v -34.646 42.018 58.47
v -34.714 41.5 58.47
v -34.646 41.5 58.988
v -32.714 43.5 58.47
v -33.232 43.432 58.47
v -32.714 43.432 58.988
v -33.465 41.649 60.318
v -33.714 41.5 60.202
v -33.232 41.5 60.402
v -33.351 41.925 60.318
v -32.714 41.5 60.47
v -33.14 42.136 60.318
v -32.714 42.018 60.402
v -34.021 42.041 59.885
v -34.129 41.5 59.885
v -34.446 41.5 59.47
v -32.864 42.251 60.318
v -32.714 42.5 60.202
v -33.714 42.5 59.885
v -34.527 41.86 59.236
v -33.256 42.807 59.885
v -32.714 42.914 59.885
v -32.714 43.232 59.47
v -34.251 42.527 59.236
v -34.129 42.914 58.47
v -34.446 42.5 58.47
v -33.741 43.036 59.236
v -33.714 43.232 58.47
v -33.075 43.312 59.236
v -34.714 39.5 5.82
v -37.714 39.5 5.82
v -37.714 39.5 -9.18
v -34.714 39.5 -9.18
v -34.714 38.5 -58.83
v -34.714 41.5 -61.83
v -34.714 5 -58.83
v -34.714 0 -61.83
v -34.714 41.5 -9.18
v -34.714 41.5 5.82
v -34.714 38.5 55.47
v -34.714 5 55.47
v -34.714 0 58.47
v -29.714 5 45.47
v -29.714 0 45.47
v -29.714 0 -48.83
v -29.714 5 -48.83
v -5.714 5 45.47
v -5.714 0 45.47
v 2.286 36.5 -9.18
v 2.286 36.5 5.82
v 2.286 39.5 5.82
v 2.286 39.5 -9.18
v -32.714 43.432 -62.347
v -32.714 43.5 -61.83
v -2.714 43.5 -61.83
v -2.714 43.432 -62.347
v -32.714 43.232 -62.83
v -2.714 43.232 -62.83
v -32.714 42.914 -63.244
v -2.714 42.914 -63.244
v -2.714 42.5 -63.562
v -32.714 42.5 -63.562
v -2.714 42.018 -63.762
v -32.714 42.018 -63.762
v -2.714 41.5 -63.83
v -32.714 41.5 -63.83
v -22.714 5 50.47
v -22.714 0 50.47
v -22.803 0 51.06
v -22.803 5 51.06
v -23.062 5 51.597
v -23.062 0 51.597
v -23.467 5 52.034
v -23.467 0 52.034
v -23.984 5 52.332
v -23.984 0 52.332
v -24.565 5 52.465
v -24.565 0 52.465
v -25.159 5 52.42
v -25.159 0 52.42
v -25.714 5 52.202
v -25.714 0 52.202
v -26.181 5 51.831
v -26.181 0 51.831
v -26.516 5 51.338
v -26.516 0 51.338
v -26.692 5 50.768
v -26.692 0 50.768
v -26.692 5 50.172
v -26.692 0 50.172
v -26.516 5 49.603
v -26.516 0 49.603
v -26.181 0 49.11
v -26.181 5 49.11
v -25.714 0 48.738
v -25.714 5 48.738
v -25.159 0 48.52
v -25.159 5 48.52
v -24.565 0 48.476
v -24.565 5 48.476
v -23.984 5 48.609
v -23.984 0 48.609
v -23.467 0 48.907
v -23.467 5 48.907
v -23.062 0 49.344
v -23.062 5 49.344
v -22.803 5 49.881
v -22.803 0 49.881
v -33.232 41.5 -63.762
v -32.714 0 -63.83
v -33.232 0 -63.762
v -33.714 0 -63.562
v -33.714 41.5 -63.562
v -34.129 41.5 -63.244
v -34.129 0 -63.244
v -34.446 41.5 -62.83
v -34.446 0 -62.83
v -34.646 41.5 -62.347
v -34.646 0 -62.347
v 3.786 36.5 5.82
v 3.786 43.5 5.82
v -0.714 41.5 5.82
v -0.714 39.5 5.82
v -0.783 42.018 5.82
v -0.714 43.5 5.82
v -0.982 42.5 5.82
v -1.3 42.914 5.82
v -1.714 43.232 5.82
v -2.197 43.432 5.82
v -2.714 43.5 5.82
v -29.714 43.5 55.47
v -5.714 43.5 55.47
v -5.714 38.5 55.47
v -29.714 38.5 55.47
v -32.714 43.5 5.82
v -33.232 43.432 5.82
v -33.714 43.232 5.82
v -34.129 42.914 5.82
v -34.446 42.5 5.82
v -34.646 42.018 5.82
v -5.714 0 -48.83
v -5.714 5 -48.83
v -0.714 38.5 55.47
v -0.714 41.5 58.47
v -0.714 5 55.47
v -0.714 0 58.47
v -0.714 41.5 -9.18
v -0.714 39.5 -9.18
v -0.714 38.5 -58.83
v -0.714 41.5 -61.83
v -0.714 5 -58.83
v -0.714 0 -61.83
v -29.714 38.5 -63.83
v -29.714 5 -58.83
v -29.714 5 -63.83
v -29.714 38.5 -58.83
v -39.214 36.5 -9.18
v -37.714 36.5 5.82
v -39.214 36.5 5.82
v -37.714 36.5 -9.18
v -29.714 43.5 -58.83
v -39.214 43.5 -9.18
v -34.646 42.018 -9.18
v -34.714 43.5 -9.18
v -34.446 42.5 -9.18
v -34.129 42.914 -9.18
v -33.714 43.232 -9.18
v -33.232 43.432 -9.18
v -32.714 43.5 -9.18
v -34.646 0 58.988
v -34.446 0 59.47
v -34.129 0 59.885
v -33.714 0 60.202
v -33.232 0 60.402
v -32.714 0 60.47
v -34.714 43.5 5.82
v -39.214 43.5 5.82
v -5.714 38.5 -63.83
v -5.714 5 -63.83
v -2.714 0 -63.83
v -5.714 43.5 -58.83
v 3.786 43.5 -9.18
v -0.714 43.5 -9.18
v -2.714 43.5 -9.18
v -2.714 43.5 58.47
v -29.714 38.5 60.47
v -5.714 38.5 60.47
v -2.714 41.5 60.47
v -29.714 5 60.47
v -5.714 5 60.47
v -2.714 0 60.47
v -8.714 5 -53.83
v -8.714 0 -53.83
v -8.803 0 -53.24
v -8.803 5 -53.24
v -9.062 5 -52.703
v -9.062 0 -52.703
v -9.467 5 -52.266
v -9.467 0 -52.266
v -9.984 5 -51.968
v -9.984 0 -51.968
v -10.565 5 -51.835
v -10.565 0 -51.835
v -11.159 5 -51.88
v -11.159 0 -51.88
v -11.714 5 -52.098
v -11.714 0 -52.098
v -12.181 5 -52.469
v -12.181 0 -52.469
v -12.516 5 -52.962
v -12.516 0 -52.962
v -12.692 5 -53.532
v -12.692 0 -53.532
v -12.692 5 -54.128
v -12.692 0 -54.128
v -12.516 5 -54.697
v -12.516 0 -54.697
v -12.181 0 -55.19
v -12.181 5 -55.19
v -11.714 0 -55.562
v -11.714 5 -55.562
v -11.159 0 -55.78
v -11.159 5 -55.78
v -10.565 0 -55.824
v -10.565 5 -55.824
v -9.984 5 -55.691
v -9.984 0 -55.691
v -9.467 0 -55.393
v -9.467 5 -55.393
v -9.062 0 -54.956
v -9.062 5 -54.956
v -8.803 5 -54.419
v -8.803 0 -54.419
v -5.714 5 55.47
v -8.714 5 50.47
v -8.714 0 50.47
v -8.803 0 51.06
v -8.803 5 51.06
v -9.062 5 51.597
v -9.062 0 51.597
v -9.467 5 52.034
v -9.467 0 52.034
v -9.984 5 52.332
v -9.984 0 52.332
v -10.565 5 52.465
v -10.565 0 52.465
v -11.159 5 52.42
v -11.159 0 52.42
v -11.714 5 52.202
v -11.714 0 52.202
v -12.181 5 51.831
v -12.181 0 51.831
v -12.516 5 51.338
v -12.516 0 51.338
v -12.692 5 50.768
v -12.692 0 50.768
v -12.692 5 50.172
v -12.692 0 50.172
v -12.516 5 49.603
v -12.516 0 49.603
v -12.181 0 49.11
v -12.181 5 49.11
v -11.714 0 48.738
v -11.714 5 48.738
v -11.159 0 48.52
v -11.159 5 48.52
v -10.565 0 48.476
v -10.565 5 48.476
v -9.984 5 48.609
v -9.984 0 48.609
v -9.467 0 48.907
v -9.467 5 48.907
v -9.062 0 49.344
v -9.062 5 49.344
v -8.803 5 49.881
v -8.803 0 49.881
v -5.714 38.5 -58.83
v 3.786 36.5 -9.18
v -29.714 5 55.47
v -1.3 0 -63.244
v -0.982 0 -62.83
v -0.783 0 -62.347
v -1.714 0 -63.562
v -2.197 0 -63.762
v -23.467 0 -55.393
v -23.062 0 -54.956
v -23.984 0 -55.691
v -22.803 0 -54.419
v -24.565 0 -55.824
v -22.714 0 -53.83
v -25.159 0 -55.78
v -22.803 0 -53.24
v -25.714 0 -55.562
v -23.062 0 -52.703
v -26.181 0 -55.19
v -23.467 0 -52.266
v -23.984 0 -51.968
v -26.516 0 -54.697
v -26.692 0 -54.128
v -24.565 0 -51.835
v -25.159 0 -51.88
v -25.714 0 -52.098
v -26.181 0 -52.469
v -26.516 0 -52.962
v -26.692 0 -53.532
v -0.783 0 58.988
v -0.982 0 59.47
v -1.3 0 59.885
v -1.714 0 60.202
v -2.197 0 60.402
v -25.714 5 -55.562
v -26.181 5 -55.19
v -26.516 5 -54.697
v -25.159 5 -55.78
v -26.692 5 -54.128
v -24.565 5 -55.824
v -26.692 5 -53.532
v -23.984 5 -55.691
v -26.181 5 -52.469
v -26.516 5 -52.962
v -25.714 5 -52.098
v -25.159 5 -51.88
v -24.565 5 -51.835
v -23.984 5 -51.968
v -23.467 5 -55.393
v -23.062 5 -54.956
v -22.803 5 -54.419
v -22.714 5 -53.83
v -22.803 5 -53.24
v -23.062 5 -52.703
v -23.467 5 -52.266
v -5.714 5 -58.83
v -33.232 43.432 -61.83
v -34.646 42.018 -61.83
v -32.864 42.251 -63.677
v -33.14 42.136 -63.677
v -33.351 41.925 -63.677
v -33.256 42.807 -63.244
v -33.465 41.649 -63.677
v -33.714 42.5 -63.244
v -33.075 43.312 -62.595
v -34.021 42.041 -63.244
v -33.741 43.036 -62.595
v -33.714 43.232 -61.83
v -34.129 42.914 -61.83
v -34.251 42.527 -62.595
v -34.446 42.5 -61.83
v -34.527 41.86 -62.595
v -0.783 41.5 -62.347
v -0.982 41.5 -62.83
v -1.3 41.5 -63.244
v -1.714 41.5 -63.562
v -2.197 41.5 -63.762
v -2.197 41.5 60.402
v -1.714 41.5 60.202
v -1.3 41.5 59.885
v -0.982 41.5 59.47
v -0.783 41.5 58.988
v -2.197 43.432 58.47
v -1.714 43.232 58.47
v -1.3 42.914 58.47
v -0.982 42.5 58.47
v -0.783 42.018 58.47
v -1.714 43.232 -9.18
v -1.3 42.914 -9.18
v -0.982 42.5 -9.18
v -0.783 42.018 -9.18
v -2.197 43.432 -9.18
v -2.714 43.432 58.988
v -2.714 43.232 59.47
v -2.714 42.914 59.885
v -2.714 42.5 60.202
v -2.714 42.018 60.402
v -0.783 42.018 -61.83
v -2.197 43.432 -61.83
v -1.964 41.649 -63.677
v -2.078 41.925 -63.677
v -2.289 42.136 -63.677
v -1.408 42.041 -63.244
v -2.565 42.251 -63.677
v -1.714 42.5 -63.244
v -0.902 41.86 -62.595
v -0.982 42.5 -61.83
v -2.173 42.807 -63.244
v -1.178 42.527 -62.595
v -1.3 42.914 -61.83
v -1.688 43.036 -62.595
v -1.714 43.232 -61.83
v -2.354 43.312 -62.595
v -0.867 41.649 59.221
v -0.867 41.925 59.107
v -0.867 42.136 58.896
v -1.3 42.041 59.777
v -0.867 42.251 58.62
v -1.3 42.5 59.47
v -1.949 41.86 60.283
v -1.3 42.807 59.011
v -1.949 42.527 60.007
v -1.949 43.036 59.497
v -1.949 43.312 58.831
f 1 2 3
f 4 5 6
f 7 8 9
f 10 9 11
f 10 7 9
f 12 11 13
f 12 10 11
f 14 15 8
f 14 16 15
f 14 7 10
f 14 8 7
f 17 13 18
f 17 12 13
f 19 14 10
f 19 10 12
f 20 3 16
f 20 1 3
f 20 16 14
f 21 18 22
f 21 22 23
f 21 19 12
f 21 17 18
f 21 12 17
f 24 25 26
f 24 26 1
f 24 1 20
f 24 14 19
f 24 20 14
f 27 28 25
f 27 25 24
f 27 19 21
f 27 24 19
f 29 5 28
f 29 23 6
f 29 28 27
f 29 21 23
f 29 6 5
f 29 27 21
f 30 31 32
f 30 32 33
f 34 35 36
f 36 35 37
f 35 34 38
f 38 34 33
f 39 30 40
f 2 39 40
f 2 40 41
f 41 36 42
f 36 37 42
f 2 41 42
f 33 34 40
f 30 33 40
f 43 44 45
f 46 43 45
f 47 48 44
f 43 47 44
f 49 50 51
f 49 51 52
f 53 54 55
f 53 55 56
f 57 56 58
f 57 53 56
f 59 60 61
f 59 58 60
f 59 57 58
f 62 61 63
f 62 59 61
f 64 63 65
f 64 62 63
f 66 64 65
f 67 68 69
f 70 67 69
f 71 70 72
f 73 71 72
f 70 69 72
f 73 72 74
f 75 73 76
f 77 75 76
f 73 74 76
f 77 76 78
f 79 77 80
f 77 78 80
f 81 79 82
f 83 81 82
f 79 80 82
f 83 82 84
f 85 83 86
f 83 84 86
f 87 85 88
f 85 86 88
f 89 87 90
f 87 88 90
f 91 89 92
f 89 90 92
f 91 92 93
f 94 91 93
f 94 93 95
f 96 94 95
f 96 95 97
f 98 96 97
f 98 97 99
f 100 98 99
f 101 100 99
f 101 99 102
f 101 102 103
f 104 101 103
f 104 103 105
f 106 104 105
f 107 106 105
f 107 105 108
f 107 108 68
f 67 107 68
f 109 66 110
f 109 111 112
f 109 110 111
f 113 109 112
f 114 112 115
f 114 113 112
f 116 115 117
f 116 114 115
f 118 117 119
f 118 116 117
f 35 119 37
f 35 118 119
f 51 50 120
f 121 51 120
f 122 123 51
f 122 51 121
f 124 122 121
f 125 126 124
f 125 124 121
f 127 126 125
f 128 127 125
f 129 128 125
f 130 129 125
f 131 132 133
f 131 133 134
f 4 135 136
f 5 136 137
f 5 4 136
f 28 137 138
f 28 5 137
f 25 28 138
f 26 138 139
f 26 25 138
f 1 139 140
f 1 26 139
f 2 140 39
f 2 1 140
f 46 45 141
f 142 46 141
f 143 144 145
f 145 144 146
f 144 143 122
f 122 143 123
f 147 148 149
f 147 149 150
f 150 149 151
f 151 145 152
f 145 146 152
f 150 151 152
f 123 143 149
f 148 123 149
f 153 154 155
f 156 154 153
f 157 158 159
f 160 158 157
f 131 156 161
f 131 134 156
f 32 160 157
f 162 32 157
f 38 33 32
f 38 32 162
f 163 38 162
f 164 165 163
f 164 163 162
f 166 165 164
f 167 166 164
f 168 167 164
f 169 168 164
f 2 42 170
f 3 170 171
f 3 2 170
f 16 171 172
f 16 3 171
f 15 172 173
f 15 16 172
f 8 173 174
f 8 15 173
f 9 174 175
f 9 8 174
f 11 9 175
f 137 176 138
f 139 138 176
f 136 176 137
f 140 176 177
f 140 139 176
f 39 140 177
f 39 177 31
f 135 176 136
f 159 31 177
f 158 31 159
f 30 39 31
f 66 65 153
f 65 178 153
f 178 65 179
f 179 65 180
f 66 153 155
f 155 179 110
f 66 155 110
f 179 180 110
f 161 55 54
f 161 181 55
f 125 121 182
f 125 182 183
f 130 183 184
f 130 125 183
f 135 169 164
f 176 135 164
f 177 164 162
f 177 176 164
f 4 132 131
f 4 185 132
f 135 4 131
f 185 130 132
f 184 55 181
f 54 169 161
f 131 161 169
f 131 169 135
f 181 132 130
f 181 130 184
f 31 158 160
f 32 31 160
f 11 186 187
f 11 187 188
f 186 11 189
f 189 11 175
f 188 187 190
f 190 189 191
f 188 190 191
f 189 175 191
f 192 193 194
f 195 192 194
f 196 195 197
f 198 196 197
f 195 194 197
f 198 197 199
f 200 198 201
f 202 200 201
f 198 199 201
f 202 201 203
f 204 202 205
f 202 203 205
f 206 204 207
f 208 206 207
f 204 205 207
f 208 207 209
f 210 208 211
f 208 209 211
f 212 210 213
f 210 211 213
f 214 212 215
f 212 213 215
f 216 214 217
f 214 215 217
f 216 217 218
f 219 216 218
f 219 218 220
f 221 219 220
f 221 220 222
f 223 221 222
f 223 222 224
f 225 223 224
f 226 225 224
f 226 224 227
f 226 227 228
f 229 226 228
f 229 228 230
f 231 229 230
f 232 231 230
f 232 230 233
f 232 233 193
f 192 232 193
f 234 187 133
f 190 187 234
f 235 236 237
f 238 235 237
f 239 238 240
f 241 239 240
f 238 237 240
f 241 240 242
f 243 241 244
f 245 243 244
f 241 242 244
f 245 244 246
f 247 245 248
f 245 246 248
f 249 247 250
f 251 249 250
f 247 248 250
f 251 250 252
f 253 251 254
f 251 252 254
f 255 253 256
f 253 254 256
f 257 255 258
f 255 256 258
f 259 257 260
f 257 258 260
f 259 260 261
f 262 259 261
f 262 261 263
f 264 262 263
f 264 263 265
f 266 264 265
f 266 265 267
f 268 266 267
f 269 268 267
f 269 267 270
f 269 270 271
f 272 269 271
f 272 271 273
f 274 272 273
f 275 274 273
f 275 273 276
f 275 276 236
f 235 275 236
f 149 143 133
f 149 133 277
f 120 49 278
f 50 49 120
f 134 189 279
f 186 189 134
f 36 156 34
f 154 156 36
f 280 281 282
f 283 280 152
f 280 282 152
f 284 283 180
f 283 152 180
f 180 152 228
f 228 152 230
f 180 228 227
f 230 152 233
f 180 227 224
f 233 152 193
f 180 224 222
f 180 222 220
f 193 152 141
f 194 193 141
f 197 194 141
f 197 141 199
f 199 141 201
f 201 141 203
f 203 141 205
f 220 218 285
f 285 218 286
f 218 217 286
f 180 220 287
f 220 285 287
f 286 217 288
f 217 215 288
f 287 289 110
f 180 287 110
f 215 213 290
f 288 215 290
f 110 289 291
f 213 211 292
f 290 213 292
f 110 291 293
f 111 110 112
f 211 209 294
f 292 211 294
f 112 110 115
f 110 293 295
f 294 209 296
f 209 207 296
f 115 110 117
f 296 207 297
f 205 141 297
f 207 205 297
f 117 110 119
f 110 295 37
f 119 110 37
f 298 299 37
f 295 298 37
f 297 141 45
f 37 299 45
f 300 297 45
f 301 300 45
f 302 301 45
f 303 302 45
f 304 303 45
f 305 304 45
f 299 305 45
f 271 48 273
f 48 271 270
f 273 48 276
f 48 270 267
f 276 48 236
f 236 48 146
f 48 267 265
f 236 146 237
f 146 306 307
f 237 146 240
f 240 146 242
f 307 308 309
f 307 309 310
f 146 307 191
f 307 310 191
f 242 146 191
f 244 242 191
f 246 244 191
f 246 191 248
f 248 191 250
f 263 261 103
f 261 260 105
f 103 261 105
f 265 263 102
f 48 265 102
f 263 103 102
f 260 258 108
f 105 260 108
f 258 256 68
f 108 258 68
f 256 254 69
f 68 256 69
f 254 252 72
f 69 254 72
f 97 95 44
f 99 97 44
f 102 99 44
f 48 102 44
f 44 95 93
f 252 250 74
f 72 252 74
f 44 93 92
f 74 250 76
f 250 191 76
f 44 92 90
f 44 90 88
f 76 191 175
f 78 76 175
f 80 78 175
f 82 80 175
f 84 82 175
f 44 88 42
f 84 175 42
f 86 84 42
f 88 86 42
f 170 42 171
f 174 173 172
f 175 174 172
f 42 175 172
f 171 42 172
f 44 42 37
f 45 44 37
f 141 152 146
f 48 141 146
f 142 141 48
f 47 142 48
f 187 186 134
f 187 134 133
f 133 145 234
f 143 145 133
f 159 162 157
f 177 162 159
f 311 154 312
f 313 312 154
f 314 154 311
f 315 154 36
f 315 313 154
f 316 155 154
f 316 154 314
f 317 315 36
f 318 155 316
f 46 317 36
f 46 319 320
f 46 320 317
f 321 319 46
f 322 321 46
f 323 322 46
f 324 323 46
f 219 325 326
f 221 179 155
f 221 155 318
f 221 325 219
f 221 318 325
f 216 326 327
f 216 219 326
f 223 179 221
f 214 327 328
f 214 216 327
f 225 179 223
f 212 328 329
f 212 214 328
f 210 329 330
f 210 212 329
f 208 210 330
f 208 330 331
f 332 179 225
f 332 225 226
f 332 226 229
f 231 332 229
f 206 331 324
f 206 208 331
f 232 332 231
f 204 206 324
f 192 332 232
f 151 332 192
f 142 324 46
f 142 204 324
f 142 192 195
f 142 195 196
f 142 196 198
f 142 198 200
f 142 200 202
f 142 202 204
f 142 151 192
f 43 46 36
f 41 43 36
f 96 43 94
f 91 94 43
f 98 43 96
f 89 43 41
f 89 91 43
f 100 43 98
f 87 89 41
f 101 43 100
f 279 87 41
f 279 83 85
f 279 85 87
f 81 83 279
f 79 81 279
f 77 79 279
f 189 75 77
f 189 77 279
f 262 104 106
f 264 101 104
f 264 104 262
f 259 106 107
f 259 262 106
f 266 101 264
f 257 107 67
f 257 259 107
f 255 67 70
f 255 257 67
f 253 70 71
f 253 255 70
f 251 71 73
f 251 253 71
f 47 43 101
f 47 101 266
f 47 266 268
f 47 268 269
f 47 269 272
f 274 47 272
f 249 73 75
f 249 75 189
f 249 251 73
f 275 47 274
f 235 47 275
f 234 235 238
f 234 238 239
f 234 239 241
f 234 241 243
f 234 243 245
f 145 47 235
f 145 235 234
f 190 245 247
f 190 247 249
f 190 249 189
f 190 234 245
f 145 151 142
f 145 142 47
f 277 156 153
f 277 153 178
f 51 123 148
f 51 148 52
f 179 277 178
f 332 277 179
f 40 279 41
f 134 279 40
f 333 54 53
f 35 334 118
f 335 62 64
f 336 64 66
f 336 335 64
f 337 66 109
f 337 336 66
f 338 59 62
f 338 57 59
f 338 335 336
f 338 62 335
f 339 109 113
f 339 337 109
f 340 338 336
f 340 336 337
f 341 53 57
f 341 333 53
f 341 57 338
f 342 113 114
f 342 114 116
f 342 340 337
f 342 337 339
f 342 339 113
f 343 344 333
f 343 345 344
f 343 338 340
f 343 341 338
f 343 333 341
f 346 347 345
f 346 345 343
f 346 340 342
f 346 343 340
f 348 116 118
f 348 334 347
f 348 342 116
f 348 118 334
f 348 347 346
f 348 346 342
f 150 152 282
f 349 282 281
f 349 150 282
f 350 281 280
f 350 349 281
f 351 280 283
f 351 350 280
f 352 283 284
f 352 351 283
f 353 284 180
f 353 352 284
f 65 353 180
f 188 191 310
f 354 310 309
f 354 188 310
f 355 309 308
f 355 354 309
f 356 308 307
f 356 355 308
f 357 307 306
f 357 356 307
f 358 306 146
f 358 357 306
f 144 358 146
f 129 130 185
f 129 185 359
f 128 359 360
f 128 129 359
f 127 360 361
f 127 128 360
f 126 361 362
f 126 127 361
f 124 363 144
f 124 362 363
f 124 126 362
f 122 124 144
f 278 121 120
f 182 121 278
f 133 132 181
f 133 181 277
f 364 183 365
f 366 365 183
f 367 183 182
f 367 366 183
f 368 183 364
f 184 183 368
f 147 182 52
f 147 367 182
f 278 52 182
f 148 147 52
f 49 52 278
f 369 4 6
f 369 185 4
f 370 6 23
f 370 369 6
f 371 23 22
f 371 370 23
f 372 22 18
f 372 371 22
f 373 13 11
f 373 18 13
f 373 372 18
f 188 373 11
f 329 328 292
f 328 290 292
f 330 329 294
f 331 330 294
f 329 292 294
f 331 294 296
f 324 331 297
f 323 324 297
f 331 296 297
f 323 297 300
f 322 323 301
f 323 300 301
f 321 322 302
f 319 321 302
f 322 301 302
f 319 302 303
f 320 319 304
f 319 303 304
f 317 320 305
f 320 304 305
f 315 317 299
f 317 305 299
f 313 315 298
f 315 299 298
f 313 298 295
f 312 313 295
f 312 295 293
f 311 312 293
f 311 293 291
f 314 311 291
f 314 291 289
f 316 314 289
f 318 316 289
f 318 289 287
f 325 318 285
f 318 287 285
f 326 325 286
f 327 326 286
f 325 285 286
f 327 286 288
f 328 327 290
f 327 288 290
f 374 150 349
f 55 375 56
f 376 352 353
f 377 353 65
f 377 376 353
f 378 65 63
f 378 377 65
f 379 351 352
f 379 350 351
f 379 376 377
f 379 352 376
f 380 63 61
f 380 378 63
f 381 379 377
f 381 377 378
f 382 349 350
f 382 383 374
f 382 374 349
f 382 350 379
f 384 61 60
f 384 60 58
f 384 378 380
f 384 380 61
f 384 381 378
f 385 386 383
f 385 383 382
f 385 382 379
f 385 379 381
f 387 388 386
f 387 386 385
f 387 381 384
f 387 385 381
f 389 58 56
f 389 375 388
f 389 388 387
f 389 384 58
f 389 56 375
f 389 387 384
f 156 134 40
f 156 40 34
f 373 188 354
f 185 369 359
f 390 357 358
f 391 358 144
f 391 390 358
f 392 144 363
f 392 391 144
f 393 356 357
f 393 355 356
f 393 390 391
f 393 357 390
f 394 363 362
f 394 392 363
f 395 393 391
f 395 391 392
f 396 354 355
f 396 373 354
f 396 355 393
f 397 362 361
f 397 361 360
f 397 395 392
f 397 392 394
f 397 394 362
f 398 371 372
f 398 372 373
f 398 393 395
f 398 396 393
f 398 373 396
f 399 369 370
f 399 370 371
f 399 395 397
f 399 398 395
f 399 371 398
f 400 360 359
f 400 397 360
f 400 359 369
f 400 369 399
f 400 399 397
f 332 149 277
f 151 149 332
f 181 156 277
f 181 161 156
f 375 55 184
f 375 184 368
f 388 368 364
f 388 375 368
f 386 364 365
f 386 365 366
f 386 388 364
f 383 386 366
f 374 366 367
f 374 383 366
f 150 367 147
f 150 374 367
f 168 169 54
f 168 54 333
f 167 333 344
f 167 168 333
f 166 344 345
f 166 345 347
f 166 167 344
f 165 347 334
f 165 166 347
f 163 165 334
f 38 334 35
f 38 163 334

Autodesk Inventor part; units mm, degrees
ref_plane "YZ Plane" through (0, 0, 0) normal (1, 0, 0) x (0, 1, 0)
ref_plane "XZ Plane" through (0, 0, 0) normal (0, 1, 0) x (-1, 0, 0)
ref_plane "XY Plane" through (0, 0, 0) normal (0, 0, 1) x (1, 0, 0)
sketch "Sketch2" plane through (0, 0, 0) normal (0, 1, 0) x (-1, 0, 0)
  line L0 (34.7144, 60.4703) -> (0.7144, 60.4703)
  line L1 (0.7144, 60.4703) -> (0.7144, -63.8297)
  line L2 (0.7144, -63.8297) -> (34.7144, -63.8297)
  line L3 (34.7144, -63.8297) -> (34.7144, 60.4703)
  point P0 (0, 0)
  dimension "d0" = 124.3
  dimension "d1" = 34
extrude "Extrusion1" add sketch "Sketch2" along normal blind 43.5
sketch "Sketch3" plane through (0, 43.5, 0) normal (0, 1, 0) x (1, 0, 0)
  line L0 (-34.7144, -60.4703) -> (-0.7144, -60.4703) construction
  line L1 (-0.7144, -60.4703) -> (-0.7144, 63.8297) construction
  line L2 (-0.7144, 63.8297) -> (-34.7144, 63.8297) construction
  line L3 (-34.7144, 63.8297) -> (-34.7144, -60.4703) construction
  line L4 (-29.7144, 58.8297) -> (-5.7144, 58.8297)
  line L5 (-5.7144, 58.8297) -> (-5.7144, -55.4703)
  line L6 (-5.7144, -55.4703) -> (-29.7144, -55.4703)
  line L7 (-29.7144, -55.4703) -> (-29.7144, 58.8297)
  point P0 (0, 0)
  dimension "d4" = 114.3
  dimension "d5" = 24
  dimension "d6" = 5
  dimension "d7" = 5
  dimension "d8" = 5
  dimension "d9" = 5
extrude "Extrusion2" cut sketch "Sketch3" against normal blind 38.5
sketch "Sketch4" plane through (-0.7144, 0, 60.4703) normal (1, 0, 0) x (0, 0, -1)
  line L0 (124.3, 0) -> (124.3, 43.5) construction
  line L1 (0, 43.5) -> (124.3, 43.5) construction
  line L2 (54.65, 43.5) -> (69.65, 43.5)
  line L3 (69.65, 43.5) -> (69.65, 36.5)
  line L4 (69.65, 36.5) -> (54.65, 36.5)
  line L5 (54.65, 36.5) -> (54.65, 43.5)
  point P0 (60.4703, 0)
  dimension "d12" = 15
  dimension "d13" = 7
  dimension "d14" = 0
  dimension "d15" = 54.65
extrude "Extrusion3" add sketch "Sketch4" along normal blind 4.5
sketch "Sketch5" plane through (-34.7144, 0, -63.8297) normal (-1, 0, 0) x (0, 0, 1)
  line L0 (124.3, 0) -> (124.3, 43.5) construction
  line L1 (0, 43.5) -> (124.3, 43.5) construction
  line L2 (54.65, 43.5) -> (69.65, 43.5)
  line L3 (69.65, 43.5) -> (69.65, 36.5)
  line L4 (69.65, 36.5) -> (54.65, 36.5)
  line L5 (54.65, 36.5) -> (54.65, 43.5)
  point P0 (63.8297, 0)
  dimension "d18" = 7
  dimension "d19" = 15
  dimension "d20" = 0
  dimension "d21" = 54.65
extrude "Extrusion4" add sketch "Sketch5" along normal blind 4.5
sketch "Sketch6" plane through (-34.7144, 36.5, -9.1797) normal (0, -1, 0) x (1, 0, 0)
  line L0 (0, 15) -> (0, 0) construction
  line L1 (0, 15) -> (-4.5, 15) construction
  line L2 (-3, 0) -> (0, 0)
  line L3 (0, 0) -> (0, 15)
  line L4 (0, 15) -> (-3, 15)
  line L5 (-3, 15) -> (-3, 0)
  point P0 (34.7144, 9.1797)
  dimension "d24" = 15
  dimension "d25" = 3
  dimension "d26" = 0
  dimension "d27" = 0
extrude "Extrusion5" cut sketch "Sketch6" against normal blind 3
sketch "Sketch7" plane through (-0.7144, 36.5, -9.1797) normal (0, -1, 0) x (1, 0, 0)
  line L0 (0, 0) -> (0, 15) construction
  line L1 (0, 15) -> (4.5, 15) construction
  line L2 (0, 15) -> (3, 15)
  line L3 (3, 15) -> (3, 0)
  line L4 (3, 0) -> (0, 0)
  line L5 (0, 0) -> (0, 15)
  point P0 (0.7144, 9.1797)
  dimension "d30" = 15
  dimension "d31" = 3
  dimension "d32" = 0
  dimension "d33" = 0
extrude "Extrusion6" cut sketch "Sketch7" against normal blind 3
sketch "Sketch8" plane through (-34.7144, 0, 60.4703) normal (0, 0, 1) x (1, 0, 0)
  line L0 (0, 0) -> (34, 0) construction
  line L1 (34, 0) -> (34, 43.5) construction
  line L2 (0, 43.5) -> (34, 43.5) construction
  line L3 (0, 0) -> (0, 43.5) construction
  line L4 (5, 38.5) -> (29, 38.5)
  line L5 (29, 38.5) -> (29, 5)
  line L6 (29, 5) -> (5, 5)
  line L7 (5, 5) -> (5, 38.5)
  point P0 (34.7144, 0)
  dimension "d36" = 33.5
  dimension "d37" = 24
  dimension "d38" = 5
  dimension "d39" = 5
  dimension "d40" = 5
  dimension "d41" = 5
extrude "Extrusion7" cut sketch "Sketch8" against normal blind 124.3
sketch "Sketch9" plane through (-0.7144, 0, 60.4703) normal (1, 0, 0) x (0, 0, -1)
  line L0 (0, 0) -> (0, 43.5) construction
  line L1 (0, 0) -> (124.3, 0) construction
  line L2 (124.3, 0) -> (124.3, 43.5) construction
  line L3 (69.65, 43.5) -> (124.3, 43.5) construction
  line L4 (5, 38.5) -> (119.3, 38.5)
  line L5 (119.3, 38.5) -> (119.3, 5)
  line L6 (119.3, 5) -> (5, 5)
  line L7 (5, 5) -> (5, 38.5)
  point P0 (60.4703, 0)
  dimension "d44" = 114.3
  dimension "d45" = 33.5
  dimension "d46" = 5
  dimension "d47" = 5
  dimension "d48" = 5
  dimension "d49" = 5
extrude "Extrusion8" cut sketch "Sketch9" against normal blind 34
sketch "Sketch11" plane through (0, 0, 0) normal (0, -1, 0) x (1, 0, 0)
  line L0 (-34.7144, 60.4703) -> (-0.7144, 60.4703) construction
  line L1 (-34.7144, -63.8297) -> (-34.7144, 60.4703) construction
  line L2 (-0.7144, -63.8297) -> (-34.7144, -63.8297) construction
  line L3 (-0.7144, 60.4703) -> (-0.7144, -63.8297) construction
  circle A0 centre (-24.7144, -53.8297) radius 2
  circle A1 centre (-10.7144, -53.8297) radius 2
  circle A2 centre (-24.7144, 50.4703) radius 2
  circle A3 centre (-10.7144, 50.4703) radius 2
  line L4 (-29.7144, -48.8297) -> (-5.7144, -48.8297)
  line L5 (-5.7144, -48.8297) -> (-5.7144, 45.4703)
  line L6 (-5.7144, 45.4703) -> (-29.7144, 45.4703)
  line L7 (-29.7144, 45.4703) -> (-29.7144, -48.8297)
  point P0 (0, 0)
  dimension "d52" = 4
  dimension "d53" = 10
  dimension "d54" = 10
  dimension "d55" = 4
  dimension "d56" = 10
  dimension "d57" = 10
  dimension "d58" = 4
  dimension "d59" = 10
  dimension "d60" = 10
  dimension "d61" = 4
  dimension "d62" = 10
  dimension "d63" = 10
  dimension "d66" = 94.3
  dimension "d67" = 24
  dimension "d68" = 5
  dimension "d69" = 5
  dimension "d70" = 5
  dimension "d71" = 5
extrude "Extrusion9" cut sketch "Sketch11" against normal blind 5 contours A0 | A1 | A2 | A3
sketch "Sketch12" plane through (0, 0, 0) normal (0, -1, 0) x (1, 0, 0)
  circle A0 centre (-24.7144, 50.4703) radius 2 construction
  circle A1 centre (-24.7144, -53.8297) radius 2 construction
  line L0 (-34.7144, -63.8297) -> (-34.7144, 60.4703) construction
  line L1 (-0.7144, 60.4703) -> (-0.7144, -63.8297) construction
  line L2 (-29.7144, -48.8297) -> (-5.7144, -48.8297)
  line L3 (-5.7144, -48.8297) -> (-5.7144, 45.4703)
  line L4 (-5.7144, 45.4703) -> (-29.7144, 45.4703)
  line L5 (-29.7144, 45.4703) -> (-29.7144, -48.8297)
  point P0 (0, 0)
  dimension "d72" = 94.3
  dimension "d73" = 24
  dimension "d74" = 5
  dimension "d75" = 5
  dimension "d76" = 5
  dimension "d77" = 5
extrude "Extrusion10" cut sketch "Sketch12" against normal blind 5
fillet "Fillet1" radius 2 10 edges at (-34.7144, 43.5, -36.5047) (-34.7144, 43.5, 33.1453) (-17.7144, 43.5, 60.4703) (-0.7144, 43.5, 33.1453) (-0.7144, 43.5, -36.5047) (-17.7144, 43.5, -63.8297) (-34.7144, 21.75, 60.4703) (-0.7144, 21.75, 60.4703) (-0.7144, 21.75, -63.8297) (-34.7144, 21.75, -63.8297)
properties part number "Battery Case"
